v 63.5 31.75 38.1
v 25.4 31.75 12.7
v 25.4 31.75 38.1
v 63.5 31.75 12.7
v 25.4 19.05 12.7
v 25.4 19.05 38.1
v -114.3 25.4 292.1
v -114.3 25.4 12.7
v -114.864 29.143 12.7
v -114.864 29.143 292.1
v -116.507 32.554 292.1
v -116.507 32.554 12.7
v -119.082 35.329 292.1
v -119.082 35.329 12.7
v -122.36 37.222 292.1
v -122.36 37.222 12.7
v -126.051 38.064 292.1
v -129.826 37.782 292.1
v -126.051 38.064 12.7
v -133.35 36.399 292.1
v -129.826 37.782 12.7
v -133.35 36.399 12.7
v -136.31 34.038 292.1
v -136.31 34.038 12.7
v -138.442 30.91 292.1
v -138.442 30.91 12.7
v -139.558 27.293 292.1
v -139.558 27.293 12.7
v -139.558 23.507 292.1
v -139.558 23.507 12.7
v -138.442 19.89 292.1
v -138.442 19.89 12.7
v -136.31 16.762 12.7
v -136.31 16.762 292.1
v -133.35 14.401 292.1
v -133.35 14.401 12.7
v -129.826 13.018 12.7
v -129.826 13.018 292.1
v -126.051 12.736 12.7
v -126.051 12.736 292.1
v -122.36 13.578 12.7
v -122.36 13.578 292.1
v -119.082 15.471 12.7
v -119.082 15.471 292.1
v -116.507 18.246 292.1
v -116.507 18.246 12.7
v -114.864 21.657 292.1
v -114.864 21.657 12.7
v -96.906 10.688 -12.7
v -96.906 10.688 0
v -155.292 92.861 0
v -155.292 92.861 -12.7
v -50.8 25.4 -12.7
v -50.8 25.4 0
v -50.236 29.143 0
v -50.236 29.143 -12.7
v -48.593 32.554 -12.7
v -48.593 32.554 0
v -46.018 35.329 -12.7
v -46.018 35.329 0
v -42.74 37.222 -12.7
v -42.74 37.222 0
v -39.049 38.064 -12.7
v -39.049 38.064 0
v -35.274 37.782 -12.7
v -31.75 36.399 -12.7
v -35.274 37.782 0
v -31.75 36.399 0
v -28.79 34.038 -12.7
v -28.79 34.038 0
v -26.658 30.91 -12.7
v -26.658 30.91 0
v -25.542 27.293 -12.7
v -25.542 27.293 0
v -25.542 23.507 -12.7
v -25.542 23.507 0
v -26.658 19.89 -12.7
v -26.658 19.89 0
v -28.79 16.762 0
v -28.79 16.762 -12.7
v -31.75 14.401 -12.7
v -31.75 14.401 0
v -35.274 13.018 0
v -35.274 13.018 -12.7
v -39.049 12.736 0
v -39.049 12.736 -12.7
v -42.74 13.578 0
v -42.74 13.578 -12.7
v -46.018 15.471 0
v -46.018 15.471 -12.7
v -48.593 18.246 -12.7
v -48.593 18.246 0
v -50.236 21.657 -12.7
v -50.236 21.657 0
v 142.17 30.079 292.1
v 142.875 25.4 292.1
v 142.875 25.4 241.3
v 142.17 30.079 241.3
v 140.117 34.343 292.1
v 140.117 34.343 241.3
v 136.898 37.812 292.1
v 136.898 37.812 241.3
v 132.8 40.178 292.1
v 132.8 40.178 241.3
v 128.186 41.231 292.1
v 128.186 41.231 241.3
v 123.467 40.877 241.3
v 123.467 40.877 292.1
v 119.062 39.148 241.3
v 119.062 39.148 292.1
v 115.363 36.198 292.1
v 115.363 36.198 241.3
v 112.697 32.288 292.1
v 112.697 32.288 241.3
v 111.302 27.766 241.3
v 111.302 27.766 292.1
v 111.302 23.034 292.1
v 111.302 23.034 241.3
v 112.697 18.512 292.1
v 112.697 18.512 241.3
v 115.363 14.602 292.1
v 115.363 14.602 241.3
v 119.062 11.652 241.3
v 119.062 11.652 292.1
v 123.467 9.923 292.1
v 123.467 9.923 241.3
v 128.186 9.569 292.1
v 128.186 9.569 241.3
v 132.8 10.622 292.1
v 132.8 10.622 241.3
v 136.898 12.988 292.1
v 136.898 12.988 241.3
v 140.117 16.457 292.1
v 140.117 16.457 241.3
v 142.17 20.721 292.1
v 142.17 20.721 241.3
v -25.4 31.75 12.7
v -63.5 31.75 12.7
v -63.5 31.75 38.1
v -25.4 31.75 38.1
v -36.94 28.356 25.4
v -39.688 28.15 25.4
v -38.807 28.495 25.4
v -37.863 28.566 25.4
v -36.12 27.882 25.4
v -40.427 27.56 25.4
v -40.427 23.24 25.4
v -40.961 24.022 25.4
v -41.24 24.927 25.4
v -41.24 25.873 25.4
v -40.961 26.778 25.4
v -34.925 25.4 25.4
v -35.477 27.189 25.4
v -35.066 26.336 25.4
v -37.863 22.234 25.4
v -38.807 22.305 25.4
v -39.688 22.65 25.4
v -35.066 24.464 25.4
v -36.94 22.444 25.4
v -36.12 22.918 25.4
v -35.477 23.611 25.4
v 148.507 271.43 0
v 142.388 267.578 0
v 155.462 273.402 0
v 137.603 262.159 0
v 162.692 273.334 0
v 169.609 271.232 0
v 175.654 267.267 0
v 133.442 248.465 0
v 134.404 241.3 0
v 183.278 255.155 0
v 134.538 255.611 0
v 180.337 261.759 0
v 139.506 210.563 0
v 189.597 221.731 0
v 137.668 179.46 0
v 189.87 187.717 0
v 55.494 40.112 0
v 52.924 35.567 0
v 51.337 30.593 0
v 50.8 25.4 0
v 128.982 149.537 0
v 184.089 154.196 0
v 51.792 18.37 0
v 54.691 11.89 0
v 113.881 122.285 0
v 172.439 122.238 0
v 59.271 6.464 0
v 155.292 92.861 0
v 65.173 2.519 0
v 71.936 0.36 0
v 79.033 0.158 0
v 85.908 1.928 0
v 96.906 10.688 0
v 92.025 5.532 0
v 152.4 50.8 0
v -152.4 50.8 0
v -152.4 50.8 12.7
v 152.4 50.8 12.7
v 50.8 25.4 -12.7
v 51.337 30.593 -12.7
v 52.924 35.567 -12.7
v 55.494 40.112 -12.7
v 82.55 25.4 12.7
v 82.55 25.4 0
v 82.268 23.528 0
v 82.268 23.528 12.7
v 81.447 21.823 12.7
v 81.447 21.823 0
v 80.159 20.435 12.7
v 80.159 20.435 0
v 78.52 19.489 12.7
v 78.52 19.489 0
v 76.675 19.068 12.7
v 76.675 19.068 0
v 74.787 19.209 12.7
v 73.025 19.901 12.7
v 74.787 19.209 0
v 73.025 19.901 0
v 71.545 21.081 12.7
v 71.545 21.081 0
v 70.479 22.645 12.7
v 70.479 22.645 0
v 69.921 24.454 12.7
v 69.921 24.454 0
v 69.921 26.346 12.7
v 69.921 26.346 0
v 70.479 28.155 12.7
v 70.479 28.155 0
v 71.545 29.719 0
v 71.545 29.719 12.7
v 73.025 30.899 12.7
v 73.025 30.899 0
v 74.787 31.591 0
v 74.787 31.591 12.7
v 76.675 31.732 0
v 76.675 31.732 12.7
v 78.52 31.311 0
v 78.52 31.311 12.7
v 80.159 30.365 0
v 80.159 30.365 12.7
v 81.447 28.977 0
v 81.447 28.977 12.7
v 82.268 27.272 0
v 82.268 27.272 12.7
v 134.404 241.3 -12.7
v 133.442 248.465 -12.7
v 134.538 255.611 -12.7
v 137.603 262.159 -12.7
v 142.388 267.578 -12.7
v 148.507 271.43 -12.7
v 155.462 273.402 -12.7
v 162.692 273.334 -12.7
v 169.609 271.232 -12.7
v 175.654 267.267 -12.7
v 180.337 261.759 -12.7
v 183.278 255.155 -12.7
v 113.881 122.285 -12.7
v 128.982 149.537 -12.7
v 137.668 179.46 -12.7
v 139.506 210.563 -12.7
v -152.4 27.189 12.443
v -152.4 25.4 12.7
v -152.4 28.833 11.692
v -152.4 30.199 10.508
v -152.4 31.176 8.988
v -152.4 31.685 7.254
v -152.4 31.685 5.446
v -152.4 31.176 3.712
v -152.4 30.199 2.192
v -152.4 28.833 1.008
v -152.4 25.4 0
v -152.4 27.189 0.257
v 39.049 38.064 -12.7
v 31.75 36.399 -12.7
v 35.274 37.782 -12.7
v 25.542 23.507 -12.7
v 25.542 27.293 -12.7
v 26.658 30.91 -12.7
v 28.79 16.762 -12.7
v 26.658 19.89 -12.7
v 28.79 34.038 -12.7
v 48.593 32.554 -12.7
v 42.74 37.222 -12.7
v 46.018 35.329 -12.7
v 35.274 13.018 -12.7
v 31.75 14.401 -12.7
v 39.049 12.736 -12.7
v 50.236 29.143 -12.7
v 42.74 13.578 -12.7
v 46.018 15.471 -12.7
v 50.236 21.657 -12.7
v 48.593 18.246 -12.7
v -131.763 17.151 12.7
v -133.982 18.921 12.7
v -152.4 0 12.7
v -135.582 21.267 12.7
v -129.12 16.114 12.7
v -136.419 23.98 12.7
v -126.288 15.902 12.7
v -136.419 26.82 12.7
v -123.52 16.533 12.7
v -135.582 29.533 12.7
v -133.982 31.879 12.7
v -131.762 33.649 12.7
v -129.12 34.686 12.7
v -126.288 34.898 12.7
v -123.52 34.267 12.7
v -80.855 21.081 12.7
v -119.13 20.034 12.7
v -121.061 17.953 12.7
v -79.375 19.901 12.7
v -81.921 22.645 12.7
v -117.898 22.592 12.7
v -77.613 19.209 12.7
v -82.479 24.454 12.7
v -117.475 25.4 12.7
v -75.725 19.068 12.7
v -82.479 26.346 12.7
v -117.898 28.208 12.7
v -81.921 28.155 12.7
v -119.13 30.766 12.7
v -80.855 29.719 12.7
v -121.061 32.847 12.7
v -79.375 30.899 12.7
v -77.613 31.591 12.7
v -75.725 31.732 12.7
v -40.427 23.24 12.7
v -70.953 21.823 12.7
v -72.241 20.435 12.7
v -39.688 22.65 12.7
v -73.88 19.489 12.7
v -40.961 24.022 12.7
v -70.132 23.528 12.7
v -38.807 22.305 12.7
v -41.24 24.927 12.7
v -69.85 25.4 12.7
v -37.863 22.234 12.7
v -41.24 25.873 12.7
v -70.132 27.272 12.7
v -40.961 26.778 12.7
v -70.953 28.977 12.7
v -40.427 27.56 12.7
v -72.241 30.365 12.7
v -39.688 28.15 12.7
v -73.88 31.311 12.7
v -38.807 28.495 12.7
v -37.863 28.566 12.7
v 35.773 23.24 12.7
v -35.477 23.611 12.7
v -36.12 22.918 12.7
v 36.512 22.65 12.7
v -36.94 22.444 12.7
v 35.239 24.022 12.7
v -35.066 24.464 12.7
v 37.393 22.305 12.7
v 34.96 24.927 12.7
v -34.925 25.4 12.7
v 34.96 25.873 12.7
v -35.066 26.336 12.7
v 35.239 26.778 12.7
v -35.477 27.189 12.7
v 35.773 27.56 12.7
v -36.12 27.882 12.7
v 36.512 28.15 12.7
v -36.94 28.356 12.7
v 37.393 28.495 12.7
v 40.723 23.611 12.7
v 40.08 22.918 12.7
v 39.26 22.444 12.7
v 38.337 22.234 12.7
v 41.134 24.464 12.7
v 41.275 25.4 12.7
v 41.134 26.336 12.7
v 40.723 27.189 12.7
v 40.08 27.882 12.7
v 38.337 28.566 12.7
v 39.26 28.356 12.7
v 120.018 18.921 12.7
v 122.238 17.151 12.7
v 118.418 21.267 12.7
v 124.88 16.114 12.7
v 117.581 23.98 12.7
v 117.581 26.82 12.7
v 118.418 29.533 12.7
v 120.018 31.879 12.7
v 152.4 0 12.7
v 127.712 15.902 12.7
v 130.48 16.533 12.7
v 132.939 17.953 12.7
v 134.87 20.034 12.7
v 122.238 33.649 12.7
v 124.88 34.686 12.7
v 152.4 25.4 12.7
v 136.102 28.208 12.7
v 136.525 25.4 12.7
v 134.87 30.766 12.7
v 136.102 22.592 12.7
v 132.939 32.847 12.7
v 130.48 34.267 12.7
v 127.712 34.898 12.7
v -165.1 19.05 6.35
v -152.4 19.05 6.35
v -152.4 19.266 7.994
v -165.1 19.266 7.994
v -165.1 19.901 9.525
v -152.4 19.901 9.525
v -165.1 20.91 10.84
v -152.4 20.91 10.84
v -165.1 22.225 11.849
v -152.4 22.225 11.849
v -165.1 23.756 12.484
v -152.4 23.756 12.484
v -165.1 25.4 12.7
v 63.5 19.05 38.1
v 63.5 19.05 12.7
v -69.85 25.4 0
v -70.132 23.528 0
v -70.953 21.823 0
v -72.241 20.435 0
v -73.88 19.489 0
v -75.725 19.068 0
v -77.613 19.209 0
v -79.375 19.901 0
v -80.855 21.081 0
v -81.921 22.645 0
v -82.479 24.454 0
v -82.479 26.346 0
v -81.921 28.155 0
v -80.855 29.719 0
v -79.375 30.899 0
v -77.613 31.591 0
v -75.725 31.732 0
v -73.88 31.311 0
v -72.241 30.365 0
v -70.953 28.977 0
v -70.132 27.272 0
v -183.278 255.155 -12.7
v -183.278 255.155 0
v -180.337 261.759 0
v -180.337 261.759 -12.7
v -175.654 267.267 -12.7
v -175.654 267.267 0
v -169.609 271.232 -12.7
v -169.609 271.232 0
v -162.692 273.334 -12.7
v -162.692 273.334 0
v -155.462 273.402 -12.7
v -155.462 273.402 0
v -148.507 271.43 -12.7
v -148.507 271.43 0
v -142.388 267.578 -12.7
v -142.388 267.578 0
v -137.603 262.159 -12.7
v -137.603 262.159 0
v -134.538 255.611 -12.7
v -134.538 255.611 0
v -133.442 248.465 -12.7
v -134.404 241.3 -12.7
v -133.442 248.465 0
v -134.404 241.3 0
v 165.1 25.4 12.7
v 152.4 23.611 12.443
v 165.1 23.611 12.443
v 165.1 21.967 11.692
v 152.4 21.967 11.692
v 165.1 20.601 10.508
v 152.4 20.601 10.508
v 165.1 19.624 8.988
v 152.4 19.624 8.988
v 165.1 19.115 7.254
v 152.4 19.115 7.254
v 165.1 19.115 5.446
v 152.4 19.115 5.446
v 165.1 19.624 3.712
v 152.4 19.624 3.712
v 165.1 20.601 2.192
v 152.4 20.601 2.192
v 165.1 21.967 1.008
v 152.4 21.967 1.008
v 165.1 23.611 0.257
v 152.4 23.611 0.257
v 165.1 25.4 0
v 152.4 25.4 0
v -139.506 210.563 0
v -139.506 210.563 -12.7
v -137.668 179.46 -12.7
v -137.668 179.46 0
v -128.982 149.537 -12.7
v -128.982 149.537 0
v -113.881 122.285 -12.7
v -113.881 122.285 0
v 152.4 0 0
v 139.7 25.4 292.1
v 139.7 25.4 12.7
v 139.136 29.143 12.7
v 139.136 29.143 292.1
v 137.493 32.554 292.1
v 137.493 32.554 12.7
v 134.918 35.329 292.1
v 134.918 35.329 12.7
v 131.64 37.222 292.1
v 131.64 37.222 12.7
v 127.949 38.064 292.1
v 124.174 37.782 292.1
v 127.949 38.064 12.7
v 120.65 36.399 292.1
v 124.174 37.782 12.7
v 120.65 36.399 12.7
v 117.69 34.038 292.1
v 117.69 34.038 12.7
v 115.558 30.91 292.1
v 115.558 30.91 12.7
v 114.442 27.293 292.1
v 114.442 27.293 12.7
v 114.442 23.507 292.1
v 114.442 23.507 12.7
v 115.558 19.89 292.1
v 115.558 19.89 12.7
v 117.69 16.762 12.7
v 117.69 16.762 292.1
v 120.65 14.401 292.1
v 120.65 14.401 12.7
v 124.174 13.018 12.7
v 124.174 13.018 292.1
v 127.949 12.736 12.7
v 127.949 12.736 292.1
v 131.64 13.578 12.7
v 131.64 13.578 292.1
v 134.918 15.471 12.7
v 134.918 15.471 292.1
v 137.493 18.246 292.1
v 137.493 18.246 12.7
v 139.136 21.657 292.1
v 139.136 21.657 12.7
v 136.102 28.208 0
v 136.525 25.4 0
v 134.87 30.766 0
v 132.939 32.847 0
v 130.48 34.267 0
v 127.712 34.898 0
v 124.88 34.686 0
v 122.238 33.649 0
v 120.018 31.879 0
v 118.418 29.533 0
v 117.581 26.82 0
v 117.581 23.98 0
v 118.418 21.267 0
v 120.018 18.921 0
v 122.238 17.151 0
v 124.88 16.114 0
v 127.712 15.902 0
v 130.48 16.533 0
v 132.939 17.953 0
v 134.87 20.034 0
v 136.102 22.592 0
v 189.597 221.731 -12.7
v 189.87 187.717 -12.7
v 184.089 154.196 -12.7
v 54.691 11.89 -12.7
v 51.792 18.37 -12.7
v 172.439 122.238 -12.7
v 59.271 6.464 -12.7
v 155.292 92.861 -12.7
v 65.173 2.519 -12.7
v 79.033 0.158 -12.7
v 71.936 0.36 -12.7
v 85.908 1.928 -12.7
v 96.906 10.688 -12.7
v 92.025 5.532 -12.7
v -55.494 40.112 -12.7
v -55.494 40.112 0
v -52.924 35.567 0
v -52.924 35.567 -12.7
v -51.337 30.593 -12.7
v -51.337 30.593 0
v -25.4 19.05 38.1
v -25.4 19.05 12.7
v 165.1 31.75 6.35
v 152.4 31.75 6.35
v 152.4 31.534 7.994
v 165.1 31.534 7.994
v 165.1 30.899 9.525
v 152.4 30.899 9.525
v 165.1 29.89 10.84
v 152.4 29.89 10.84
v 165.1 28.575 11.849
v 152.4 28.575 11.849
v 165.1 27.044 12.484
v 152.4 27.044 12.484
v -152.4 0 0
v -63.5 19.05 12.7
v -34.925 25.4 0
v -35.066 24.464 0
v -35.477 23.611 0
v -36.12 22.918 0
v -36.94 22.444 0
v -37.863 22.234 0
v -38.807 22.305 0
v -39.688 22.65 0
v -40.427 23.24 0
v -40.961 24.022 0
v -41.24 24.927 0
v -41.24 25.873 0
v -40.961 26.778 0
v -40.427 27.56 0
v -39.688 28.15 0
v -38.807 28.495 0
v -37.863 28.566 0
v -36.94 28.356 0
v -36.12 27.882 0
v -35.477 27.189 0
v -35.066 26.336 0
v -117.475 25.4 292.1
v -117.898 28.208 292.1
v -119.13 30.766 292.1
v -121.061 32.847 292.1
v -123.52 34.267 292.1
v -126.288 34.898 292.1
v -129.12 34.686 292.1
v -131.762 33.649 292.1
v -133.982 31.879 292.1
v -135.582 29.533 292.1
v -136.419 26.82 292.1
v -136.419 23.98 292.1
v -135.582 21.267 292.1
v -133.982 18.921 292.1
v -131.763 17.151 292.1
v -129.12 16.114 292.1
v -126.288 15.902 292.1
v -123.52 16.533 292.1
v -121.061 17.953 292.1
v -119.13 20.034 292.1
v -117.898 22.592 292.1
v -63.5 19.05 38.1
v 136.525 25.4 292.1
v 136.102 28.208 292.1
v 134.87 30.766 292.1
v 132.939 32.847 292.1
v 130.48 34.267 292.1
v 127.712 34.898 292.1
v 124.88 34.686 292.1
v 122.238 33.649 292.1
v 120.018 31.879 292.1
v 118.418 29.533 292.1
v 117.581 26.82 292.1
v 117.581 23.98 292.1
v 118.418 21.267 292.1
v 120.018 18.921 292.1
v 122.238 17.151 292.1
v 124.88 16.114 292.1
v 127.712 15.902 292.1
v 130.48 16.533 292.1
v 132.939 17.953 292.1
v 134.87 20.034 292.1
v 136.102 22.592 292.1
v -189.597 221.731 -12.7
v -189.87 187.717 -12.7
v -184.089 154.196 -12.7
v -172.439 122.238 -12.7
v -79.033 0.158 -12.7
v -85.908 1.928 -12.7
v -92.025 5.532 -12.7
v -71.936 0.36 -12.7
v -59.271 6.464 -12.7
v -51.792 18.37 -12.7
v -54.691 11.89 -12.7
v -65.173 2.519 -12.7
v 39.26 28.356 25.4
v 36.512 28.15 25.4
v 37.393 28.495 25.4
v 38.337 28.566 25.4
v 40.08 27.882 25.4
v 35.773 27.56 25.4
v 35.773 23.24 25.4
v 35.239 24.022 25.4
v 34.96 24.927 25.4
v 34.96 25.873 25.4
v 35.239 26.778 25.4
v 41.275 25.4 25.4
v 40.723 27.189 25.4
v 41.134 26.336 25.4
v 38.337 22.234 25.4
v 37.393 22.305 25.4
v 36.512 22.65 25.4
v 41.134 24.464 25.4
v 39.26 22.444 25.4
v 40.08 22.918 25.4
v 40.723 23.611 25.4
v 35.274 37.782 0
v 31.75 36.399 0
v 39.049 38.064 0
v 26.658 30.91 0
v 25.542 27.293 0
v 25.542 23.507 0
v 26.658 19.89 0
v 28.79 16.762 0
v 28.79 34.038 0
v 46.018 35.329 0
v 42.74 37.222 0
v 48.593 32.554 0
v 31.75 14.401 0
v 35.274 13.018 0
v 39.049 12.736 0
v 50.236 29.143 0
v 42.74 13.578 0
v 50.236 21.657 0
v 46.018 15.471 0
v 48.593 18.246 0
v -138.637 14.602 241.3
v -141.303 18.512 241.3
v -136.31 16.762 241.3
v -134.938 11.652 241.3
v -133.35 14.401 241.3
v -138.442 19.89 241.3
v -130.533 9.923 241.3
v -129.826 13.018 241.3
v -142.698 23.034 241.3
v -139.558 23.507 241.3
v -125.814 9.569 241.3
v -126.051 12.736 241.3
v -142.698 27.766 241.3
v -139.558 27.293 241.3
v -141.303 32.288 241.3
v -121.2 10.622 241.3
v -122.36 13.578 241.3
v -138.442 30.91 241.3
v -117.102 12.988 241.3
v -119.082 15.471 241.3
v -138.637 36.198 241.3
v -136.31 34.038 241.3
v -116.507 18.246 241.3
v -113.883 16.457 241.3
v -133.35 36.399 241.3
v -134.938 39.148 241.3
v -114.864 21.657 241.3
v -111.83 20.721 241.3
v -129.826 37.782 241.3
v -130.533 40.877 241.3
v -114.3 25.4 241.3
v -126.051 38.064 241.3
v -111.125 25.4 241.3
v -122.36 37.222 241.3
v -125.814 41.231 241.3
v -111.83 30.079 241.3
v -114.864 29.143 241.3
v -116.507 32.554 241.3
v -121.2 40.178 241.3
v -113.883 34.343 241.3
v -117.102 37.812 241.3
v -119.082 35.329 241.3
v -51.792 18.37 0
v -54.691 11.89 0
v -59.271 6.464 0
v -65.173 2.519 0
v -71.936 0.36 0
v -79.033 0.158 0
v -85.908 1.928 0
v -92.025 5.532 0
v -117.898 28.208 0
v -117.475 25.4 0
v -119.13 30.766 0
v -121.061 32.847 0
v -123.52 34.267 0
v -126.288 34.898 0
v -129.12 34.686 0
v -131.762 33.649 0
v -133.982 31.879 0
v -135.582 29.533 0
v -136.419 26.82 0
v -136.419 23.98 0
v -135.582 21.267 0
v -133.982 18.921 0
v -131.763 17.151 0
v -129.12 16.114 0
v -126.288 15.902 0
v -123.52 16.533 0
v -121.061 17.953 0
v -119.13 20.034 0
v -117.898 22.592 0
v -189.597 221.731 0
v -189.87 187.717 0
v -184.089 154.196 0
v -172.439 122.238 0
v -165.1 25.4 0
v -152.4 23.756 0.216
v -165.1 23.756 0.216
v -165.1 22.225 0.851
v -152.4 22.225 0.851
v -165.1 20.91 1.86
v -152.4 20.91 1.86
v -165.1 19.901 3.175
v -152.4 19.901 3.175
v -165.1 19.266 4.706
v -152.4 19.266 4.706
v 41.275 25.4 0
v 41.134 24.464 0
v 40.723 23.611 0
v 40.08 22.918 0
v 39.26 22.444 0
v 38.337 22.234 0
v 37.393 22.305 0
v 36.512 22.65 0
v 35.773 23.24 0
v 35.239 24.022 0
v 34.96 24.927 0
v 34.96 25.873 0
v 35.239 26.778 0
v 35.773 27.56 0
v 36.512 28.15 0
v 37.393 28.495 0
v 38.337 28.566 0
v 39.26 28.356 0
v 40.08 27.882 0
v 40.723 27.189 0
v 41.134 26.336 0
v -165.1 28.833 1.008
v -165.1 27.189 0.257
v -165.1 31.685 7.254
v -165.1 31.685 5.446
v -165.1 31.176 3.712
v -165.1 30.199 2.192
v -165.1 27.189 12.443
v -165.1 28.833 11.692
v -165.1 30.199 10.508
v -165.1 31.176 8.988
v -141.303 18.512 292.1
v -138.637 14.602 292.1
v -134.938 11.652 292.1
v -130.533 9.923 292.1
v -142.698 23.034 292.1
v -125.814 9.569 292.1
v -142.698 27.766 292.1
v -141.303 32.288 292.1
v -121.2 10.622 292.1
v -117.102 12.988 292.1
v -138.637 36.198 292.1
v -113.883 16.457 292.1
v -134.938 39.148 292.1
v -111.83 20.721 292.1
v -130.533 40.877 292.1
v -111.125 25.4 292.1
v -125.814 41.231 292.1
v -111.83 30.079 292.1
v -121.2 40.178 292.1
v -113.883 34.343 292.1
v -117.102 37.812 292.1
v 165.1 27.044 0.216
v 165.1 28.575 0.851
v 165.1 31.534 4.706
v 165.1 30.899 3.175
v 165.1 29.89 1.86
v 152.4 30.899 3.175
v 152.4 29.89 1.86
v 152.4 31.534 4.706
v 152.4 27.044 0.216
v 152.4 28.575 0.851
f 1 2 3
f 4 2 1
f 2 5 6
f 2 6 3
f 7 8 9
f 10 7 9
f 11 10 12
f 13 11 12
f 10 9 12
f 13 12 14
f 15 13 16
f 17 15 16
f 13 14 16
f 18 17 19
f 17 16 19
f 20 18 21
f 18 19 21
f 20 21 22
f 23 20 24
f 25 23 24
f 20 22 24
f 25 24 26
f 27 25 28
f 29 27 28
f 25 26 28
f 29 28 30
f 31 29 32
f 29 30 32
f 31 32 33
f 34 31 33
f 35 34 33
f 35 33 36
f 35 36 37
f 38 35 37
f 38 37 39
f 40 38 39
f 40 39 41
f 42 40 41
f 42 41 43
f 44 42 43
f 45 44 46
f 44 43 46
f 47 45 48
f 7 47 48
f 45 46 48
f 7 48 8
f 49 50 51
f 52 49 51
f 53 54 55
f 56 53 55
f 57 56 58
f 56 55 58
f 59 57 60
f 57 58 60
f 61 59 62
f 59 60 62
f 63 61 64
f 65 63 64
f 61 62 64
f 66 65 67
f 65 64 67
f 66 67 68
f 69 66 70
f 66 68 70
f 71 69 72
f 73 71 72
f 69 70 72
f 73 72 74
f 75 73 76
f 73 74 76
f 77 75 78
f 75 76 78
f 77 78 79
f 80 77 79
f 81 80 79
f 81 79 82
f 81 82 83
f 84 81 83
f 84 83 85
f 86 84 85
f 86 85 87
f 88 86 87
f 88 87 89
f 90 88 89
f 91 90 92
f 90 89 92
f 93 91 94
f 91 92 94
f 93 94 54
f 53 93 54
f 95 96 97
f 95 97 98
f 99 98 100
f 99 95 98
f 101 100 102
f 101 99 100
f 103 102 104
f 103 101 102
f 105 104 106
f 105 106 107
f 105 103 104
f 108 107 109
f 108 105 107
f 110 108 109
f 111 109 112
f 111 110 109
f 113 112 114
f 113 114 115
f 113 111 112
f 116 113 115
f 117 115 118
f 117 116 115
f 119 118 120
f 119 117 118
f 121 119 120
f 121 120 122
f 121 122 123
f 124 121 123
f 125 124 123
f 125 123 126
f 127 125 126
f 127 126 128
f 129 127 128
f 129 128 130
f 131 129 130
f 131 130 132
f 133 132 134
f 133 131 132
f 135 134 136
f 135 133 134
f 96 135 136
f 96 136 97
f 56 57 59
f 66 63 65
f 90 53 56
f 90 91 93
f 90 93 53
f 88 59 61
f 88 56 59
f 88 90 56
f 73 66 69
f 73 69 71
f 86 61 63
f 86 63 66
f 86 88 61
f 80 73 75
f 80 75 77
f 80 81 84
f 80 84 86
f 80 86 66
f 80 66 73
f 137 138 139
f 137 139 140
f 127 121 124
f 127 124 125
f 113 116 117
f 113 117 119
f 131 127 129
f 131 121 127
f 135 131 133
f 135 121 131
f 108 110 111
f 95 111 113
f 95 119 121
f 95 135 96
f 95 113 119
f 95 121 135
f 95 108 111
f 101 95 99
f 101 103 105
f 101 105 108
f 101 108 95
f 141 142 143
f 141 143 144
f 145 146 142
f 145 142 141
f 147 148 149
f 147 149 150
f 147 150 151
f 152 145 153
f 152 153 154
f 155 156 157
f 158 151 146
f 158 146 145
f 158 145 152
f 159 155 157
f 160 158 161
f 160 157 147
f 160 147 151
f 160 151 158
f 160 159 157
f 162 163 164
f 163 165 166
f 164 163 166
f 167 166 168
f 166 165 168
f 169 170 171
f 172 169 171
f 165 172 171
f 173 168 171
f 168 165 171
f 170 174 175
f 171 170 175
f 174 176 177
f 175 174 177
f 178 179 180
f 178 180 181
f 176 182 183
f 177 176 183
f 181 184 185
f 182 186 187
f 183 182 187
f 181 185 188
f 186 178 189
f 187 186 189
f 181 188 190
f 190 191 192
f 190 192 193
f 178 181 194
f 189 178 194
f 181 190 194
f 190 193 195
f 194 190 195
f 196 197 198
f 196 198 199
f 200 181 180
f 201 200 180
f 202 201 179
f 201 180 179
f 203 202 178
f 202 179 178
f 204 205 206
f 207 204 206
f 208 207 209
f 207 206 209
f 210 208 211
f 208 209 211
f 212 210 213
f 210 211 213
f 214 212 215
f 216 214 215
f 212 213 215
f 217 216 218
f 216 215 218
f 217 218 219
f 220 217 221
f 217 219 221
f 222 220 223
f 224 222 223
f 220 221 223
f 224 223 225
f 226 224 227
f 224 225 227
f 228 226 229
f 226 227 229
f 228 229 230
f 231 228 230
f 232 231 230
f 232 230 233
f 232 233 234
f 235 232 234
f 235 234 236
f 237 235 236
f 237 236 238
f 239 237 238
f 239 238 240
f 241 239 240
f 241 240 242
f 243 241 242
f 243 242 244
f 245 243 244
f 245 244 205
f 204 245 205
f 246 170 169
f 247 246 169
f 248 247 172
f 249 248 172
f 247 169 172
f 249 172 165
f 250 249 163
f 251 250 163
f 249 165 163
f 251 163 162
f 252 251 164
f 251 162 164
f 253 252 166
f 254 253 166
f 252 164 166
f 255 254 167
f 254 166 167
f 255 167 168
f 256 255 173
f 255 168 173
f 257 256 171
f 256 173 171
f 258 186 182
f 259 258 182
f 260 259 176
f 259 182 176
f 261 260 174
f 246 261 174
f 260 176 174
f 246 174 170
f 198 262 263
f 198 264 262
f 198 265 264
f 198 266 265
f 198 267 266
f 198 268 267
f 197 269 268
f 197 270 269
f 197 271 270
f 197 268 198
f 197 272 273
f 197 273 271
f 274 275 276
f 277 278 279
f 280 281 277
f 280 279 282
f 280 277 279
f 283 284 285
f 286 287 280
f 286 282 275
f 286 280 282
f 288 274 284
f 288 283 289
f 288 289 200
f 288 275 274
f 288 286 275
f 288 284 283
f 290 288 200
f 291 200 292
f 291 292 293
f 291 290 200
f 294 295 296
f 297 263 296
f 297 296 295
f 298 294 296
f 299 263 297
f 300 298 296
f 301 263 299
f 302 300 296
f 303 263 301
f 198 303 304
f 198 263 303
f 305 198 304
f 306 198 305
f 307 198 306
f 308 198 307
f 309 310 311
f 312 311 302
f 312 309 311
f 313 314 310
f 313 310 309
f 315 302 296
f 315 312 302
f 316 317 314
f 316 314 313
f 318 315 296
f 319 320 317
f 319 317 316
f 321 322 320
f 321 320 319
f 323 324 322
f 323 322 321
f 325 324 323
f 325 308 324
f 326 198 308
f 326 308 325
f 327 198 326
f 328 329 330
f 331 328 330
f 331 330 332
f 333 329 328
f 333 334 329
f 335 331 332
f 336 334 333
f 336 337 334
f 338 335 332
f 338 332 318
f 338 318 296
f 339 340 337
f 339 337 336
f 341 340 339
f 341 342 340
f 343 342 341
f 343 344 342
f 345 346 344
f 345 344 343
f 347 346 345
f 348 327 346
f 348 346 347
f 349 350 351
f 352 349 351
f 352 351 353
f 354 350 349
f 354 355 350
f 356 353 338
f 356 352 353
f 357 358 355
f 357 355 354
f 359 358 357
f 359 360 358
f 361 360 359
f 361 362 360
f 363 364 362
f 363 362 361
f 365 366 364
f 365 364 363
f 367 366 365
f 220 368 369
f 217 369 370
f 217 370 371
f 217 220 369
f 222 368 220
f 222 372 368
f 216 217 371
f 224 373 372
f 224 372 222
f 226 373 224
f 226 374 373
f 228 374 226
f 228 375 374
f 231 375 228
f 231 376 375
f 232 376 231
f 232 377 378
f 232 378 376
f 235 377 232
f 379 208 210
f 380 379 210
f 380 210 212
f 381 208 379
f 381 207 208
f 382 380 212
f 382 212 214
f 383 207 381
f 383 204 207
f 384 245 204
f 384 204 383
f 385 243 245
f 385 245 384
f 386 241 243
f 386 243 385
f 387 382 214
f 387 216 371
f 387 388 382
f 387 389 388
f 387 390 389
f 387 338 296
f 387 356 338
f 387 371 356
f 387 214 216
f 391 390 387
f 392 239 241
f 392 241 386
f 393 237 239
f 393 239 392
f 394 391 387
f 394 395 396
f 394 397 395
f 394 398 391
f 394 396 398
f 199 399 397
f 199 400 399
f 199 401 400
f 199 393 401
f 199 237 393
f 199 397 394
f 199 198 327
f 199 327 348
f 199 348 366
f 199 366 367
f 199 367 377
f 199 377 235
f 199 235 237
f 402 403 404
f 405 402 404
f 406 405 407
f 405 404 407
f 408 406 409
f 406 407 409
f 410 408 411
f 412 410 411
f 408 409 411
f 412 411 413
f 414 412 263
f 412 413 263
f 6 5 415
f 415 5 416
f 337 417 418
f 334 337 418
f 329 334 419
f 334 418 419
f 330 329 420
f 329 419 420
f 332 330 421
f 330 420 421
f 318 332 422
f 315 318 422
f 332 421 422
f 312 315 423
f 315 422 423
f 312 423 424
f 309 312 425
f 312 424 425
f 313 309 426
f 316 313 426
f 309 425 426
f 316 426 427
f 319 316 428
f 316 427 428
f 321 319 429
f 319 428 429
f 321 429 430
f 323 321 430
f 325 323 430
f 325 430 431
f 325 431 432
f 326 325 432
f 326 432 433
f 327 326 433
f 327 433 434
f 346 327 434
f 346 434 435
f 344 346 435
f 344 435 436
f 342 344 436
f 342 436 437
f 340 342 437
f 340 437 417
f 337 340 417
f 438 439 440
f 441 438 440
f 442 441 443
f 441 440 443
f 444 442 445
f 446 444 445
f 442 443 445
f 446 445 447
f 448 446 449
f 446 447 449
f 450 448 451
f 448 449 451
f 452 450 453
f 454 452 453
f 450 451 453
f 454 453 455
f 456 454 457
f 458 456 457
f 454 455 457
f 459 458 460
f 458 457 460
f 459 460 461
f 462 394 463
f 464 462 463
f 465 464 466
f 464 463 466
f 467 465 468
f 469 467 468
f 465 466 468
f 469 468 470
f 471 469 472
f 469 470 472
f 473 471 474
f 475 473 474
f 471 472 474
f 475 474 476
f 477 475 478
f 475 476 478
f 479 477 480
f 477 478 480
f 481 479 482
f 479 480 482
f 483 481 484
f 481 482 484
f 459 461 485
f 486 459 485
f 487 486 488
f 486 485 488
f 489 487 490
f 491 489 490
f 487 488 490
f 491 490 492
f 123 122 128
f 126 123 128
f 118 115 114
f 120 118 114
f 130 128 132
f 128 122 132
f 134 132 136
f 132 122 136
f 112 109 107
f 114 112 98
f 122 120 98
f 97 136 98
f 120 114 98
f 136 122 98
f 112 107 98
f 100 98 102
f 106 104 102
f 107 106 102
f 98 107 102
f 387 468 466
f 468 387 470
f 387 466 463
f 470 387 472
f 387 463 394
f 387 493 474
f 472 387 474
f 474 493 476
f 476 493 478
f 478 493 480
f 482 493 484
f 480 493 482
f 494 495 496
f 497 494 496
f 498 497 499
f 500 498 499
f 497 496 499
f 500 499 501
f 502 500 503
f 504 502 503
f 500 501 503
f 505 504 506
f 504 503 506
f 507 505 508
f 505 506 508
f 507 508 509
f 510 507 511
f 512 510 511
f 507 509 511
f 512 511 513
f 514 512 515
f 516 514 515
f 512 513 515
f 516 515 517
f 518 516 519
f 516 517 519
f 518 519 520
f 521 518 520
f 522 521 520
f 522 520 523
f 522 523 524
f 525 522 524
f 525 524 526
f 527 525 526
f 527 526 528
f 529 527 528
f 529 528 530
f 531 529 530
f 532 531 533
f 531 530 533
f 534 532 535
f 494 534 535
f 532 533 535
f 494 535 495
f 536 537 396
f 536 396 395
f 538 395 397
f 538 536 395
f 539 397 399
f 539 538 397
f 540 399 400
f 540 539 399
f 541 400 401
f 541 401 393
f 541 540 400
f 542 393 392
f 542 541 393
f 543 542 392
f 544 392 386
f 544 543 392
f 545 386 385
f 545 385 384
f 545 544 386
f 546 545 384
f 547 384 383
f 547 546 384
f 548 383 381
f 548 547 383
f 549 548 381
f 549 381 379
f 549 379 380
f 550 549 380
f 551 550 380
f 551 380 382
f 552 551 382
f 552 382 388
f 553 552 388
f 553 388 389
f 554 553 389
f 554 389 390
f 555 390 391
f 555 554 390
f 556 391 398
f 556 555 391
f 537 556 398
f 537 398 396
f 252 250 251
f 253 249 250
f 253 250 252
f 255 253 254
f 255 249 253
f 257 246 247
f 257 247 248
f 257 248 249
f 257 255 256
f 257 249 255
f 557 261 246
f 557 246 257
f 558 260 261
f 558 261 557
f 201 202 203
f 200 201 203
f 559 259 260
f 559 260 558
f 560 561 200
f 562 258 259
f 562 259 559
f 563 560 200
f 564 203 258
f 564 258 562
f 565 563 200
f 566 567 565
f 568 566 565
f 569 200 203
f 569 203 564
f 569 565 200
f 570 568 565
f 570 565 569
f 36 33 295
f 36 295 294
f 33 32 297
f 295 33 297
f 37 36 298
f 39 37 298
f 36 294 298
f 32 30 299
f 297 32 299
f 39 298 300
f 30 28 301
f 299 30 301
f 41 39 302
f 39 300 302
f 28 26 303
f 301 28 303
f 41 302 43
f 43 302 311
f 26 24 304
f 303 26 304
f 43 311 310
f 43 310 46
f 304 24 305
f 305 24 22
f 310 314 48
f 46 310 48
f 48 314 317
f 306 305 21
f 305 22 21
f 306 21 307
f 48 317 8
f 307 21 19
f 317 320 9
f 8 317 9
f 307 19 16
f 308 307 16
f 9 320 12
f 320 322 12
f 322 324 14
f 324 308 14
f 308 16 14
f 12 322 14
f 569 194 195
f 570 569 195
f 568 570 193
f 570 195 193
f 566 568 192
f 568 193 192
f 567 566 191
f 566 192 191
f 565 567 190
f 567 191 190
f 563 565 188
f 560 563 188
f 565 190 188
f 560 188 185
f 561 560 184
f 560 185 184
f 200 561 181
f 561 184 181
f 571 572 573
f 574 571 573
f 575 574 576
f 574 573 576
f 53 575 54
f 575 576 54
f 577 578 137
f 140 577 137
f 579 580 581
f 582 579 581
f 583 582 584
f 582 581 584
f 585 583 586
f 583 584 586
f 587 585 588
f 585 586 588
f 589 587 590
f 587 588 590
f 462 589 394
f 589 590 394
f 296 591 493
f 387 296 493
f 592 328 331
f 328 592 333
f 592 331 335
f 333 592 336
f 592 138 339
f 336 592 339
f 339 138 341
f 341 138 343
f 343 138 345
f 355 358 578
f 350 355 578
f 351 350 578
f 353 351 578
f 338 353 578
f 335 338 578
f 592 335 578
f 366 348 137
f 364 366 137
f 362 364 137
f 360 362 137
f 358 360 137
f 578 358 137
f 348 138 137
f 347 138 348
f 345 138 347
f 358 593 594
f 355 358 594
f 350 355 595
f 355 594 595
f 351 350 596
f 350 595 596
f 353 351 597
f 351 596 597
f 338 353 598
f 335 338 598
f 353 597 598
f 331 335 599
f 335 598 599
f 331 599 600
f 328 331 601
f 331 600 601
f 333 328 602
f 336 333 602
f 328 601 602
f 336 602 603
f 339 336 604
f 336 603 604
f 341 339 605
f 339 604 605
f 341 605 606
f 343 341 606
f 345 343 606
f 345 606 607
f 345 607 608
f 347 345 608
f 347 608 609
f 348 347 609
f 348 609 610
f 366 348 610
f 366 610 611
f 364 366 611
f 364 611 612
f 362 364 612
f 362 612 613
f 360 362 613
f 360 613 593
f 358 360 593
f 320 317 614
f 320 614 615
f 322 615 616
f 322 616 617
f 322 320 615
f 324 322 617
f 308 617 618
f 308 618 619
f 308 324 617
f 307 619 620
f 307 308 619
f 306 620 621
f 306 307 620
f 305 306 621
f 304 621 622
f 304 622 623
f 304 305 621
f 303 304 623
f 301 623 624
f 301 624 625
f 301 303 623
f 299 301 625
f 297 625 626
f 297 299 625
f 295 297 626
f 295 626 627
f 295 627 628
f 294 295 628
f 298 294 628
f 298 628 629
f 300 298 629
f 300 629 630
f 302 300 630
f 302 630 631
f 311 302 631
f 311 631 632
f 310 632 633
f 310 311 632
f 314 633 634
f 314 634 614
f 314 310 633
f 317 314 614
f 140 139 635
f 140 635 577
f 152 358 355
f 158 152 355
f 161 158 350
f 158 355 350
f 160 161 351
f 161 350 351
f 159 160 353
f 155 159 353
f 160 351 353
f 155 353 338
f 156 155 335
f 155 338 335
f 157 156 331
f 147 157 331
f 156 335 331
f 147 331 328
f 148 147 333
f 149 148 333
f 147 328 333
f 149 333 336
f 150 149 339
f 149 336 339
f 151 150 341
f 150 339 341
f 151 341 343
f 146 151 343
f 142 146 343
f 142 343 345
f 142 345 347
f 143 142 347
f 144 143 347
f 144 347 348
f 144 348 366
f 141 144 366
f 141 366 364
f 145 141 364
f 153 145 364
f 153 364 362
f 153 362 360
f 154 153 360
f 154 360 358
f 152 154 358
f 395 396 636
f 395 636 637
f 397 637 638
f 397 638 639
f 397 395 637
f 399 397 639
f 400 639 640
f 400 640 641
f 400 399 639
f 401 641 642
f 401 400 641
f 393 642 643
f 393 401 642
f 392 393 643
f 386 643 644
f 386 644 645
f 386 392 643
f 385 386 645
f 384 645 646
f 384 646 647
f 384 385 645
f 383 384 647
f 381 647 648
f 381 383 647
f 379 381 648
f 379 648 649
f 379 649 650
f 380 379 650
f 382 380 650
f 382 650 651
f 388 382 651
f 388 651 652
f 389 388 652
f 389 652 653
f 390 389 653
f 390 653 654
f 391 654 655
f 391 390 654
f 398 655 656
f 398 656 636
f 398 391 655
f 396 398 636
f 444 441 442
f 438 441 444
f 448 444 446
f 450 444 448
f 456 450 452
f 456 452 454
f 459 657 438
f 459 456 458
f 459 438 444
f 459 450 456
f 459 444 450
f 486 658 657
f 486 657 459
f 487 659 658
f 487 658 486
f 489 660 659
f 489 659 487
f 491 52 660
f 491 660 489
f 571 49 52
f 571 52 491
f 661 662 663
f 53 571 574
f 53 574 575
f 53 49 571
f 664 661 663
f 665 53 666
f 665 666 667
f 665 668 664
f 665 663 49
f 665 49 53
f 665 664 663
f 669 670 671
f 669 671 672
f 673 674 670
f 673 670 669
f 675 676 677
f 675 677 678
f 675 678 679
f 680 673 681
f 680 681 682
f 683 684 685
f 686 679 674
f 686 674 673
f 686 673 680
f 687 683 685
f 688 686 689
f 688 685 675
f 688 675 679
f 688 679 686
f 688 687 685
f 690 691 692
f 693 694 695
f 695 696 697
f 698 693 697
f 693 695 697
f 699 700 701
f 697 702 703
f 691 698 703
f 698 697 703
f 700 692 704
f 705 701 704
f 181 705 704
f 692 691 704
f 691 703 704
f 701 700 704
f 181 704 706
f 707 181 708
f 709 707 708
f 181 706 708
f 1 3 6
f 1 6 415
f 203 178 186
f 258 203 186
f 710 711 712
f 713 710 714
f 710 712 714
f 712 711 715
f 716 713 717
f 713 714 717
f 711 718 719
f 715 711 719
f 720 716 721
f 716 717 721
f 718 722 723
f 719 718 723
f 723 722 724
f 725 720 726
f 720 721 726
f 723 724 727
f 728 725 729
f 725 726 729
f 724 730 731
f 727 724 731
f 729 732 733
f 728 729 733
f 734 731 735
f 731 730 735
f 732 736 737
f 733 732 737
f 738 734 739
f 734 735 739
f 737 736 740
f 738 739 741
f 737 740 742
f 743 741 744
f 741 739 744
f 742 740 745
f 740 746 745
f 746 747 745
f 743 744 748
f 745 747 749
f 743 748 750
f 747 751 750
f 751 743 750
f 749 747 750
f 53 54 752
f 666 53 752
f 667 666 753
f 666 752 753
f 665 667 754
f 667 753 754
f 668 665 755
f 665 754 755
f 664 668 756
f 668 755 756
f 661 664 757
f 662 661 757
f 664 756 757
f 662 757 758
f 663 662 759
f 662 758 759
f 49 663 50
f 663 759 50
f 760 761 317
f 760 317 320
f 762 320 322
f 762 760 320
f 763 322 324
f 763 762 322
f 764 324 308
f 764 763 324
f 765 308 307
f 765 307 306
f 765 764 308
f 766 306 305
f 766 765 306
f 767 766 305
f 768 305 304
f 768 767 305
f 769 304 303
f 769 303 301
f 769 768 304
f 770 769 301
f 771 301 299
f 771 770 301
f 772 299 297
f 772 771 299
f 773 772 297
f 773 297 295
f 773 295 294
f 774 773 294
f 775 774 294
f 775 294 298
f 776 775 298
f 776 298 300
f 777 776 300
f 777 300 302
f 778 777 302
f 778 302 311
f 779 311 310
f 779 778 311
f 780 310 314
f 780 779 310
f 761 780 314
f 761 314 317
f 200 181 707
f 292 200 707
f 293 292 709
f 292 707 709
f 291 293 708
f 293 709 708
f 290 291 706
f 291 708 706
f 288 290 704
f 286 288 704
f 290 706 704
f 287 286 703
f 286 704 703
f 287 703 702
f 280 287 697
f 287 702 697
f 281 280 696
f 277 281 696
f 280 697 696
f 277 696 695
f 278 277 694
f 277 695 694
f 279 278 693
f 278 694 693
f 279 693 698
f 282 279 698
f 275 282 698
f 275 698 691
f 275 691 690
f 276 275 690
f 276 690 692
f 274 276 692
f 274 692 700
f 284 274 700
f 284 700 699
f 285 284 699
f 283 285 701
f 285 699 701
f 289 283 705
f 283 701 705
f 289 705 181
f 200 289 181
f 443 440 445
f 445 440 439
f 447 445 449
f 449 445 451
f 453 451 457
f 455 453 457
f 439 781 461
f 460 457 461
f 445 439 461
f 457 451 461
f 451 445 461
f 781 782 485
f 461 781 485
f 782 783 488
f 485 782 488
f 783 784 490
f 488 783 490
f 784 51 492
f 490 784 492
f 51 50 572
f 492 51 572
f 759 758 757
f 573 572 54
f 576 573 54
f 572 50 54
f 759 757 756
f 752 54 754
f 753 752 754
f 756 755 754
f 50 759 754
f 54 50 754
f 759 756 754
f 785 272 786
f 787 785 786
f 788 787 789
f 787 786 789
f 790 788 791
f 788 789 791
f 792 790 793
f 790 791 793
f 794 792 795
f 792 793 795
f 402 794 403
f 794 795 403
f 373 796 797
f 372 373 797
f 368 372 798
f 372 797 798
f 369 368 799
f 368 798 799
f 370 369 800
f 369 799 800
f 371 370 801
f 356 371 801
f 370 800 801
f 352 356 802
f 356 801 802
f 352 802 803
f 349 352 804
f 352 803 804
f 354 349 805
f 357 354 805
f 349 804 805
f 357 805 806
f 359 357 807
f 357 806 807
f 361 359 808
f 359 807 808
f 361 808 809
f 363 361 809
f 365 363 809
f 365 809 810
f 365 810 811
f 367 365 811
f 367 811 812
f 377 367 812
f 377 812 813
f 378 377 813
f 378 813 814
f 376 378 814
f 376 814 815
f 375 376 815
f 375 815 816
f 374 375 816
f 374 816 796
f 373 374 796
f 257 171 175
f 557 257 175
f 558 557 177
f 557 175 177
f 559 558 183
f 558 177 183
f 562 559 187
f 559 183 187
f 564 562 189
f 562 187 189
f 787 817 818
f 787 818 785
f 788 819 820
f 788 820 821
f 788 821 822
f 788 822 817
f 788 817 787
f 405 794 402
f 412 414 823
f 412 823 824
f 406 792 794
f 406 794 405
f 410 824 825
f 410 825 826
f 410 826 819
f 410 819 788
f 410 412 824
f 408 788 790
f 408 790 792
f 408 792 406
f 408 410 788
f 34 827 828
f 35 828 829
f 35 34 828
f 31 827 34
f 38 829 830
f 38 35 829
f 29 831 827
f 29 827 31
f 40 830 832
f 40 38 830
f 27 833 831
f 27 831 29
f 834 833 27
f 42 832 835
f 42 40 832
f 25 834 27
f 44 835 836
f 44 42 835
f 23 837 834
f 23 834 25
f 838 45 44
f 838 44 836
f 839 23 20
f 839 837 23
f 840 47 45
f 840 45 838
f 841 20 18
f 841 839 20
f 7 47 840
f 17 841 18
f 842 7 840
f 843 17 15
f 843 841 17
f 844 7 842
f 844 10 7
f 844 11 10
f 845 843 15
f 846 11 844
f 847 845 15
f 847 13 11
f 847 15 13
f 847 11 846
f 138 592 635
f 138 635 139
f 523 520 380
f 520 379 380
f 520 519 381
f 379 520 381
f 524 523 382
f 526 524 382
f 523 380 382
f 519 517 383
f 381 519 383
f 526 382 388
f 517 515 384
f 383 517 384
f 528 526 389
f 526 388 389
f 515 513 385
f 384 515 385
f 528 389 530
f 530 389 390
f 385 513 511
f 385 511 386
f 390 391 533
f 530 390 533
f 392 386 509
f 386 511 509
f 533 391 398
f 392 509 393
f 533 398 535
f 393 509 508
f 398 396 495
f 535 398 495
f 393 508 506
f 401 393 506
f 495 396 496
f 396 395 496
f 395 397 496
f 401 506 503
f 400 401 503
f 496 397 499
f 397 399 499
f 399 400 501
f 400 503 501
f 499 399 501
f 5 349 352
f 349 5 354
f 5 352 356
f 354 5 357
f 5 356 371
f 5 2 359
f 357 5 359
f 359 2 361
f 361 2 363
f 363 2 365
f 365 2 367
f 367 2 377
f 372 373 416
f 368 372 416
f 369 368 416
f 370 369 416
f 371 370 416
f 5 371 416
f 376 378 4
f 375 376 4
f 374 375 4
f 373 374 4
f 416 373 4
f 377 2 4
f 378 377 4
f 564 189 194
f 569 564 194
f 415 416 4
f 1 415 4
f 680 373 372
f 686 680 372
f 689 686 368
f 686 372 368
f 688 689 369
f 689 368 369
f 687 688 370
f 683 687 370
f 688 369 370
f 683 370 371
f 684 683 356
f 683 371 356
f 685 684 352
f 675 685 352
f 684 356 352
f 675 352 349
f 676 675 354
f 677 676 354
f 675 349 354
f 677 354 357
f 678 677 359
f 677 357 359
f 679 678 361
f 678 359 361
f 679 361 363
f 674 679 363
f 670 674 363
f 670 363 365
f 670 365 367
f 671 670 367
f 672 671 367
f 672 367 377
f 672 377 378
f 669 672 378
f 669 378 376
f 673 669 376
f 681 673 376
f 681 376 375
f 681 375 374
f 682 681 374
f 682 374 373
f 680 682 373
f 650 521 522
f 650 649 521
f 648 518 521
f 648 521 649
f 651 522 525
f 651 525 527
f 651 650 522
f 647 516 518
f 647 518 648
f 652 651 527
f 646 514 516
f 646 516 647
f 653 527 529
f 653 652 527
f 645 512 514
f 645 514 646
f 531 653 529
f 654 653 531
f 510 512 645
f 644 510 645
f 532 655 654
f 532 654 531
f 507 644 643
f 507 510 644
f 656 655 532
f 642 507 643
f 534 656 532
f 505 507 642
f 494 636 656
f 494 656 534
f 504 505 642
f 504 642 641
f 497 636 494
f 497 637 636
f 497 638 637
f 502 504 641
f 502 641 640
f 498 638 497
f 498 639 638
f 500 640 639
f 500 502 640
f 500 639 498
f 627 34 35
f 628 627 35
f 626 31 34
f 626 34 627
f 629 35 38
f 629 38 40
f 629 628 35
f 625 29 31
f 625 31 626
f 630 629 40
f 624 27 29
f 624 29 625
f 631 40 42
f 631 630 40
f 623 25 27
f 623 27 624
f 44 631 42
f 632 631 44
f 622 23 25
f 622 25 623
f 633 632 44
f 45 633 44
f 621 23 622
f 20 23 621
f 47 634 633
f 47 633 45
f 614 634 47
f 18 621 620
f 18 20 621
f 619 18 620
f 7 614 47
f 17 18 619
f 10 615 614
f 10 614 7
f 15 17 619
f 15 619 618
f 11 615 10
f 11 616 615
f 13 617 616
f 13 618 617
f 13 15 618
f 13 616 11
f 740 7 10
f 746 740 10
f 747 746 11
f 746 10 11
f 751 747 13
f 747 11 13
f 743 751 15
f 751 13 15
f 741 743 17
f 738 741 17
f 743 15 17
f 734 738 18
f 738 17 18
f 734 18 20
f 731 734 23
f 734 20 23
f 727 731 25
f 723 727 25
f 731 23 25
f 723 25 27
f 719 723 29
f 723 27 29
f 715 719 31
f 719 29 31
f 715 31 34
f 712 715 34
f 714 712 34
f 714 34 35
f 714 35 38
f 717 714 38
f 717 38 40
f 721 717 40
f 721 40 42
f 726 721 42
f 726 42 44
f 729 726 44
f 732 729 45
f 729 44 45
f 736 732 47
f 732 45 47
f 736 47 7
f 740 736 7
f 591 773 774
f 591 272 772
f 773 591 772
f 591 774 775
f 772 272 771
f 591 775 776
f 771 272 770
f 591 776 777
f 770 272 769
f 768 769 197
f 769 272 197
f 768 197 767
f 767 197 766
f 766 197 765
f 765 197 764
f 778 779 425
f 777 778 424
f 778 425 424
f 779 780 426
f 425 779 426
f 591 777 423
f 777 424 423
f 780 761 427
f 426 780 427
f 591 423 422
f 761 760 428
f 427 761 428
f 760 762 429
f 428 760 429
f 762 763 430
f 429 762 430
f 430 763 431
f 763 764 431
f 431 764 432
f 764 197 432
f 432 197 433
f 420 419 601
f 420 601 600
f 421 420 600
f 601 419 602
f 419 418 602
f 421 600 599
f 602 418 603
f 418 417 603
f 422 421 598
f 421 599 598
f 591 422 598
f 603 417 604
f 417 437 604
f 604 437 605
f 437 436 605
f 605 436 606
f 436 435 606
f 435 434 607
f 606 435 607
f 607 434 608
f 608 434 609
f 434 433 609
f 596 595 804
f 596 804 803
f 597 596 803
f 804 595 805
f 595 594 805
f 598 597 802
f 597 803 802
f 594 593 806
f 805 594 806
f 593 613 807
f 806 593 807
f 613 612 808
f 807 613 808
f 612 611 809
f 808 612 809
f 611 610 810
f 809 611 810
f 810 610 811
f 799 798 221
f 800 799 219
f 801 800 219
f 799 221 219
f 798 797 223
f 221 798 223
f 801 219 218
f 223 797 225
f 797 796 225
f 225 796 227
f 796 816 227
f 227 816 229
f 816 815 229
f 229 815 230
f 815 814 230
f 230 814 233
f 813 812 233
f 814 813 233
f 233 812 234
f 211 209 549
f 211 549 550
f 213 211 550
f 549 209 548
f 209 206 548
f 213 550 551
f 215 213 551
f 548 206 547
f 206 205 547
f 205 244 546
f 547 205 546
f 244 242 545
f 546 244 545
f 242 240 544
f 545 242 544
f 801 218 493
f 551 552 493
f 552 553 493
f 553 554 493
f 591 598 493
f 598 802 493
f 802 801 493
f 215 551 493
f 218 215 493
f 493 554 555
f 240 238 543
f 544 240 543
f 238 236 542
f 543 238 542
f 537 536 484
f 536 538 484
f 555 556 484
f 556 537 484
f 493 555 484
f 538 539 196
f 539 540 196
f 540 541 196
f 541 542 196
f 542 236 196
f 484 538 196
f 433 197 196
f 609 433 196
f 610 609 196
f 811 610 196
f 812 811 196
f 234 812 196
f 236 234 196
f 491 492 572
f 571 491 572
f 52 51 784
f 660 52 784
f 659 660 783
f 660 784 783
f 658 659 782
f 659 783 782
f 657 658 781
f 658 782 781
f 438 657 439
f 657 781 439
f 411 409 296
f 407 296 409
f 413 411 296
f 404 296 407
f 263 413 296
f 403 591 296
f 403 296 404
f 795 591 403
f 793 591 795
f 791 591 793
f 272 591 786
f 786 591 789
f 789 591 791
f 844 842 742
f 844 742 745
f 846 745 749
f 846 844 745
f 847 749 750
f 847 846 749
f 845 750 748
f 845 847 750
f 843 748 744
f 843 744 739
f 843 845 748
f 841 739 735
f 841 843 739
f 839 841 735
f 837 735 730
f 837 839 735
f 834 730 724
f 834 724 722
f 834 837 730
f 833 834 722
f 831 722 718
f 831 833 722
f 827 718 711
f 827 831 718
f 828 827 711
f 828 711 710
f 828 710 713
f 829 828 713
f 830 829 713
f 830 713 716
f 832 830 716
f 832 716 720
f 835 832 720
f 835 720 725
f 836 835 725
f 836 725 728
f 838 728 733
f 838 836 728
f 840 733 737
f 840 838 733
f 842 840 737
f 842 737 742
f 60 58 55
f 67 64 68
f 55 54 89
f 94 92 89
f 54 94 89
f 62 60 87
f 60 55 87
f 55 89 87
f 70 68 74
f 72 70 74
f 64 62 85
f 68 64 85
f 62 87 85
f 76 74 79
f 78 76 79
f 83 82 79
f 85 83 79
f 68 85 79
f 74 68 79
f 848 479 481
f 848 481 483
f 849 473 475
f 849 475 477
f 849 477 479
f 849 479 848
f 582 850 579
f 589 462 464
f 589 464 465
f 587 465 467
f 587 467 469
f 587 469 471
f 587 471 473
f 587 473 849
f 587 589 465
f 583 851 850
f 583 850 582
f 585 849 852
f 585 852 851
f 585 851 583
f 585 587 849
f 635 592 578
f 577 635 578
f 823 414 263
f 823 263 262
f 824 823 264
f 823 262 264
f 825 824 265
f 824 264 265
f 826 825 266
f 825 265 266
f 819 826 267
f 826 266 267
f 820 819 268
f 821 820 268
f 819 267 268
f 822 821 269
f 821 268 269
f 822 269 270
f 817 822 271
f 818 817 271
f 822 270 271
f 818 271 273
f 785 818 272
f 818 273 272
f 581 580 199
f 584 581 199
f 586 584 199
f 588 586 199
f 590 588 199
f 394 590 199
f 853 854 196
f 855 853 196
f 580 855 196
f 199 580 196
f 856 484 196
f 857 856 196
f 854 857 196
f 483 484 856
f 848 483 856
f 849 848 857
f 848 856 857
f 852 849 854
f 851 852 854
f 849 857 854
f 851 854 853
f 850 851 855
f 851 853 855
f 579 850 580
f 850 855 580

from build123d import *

# Parameters (mm, degrees)
F0_W      = 304.8
F0_H      = 50.8
F0_R      = 9.525
F1_DEPTH  = 12.7
F2_R      = 12.7
F2_R_2    = 9.525
F3_DEPTH  = 279.4
F4_W      = 38.1
F4_H      = 12.7
F5_DEPTH  = 25.4
F6_R      = 3.175
F6_R_2    = 6.35
F7_DEPTH  = 25.4
F9_DEPTH  = 12.7
F8_R      = 12.7
F10_R     = 15.875
F10_R_2   = 12.7
F11_DEPTH = 50.8
F14_DEPTH = 12.7
F15_DEPTH = 12.7


with BuildPart() as f1:
    # F0 (on Top) → F1 (new body)
    with BuildSketch(Plane.XY):
        with Locations((0, 25.4)):
            Rectangle(F0_W, F0_H)
        with Locations((-127, 25.4)):
            Circle(F0_R, mode=Mode.SUBTRACT)
        with Locations((127, 25.4)):
            Circle(F0_R, mode=Mode.SUBTRACT)
    extrude(amount=F1_DEPTH)


with BuildPart() as f3:
    # F2 (on face) → F3 (new body)
    with BuildSketch(Plane.XY.offset(12.7)):
        with Locations((-127, 25.4)):
            Circle(F2_R)
        with Locations((-127, 25.4)):
            Circle(F2_R_2, mode=Mode.SUBTRACT)
    extrude(amount=F3_DEPTH)


with BuildPart() as f3b:
    # F2 (on face) → F3, piece 2 (new body)
    with BuildSketch(Plane.XY.offset(12.7)):
        with Locations((127, 25.4)):
            Circle(F2_R)
        with Locations((127, 25.4)):
            Circle(F2_R_2, mode=Mode.SUBTRACT)
    extrude(amount=F3_DEPTH)


with BuildPart() as f5:
    # F4 (on face) → F5 (new body)
    with BuildSketch(Plane.XY.offset(12.7)):
        with Locations((44.45, 25.4)):
            Rectangle(F4_W, F4_H)
    extrude(amount=F5_DEPTH)


with BuildPart() as f5b:
    # F4 (on face) → F5, piece 2 (new body)
    with BuildSketch(Plane.XY.offset(12.7)):
        with Locations((-44.45, 25.4)):
            Rectangle(F4_W, F4_H)
    extrude(amount=F5_DEPTH)


with BuildPart() as f7_tool:
    # F6 (on face) → F7 (new body)
    with BuildSketch(Plane(origin=(0, 0, 0), x_dir=(1, 0, 0), z_dir=(0, 0, -1))):
        with Locations((-38.1, -25.4)):
            Circle(F6_R)
        with Locations((38.1, -25.4)):
            Circle(F6_R)
        with Locations((-76.2, -25.4)):
            Circle(F6_R_2)
        with Locations((76.2, -25.4)):
            Circle(F6_R_2)
    extrude(amount=-F7_DEPTH)


with BuildPart() as f1_1:
    add(f1.part)

    # F7: cut by f7_tool
    add(f7_tool.part, mode=Mode.SUBTRACT)

    # F12 (on face) → F14 (join)
    with BuildSketch(Plane.YZ.offset(152.4)):
        with BuildLine():
            ThreePointArc((25.4, 0), (29.8901280605, 1.8598719395), (31.75, 6.35))
            ThreePointArc((31.75, 6.35), (29.8901280605, 10.8401280605), (25.4, 12.7))
            ThreePointArc((25.4, 12.7), (19.05, 6.35), (25.4, 0))
        make_face()
    extrude(amount=F14_DEPTH)

    # F13 (on face) → F15 (join)
    with BuildSketch(Plane(origin=(-152.4, 0, 0), x_dir=(0, -1, 0), z_dir=(-1, 0, 0))):
        with BuildLine():
            ThreePointArc((-25.4, 0), (-20.9098719395, 1.8598719395), (-19.05, 6.35))
            ThreePointArc((-19.05, 6.35), (-20.9098719395, 10.8401280605), (-25.4, 12.7))
            ThreePointArc((-25.4, 12.7), (-31.75, 6.35), (-25.4, 0))
        make_face()
    extrude(amount=F15_DEPTH)


with BuildPart() as f5_1:
    add(f5.part)

    # F7: cut by f7_tool
    add(f7_tool.part, mode=Mode.SUBTRACT)


with BuildPart() as f5b_1:
    add(f5b.part)

    # F7: cut by f7_tool
    add(f7_tool.part, mode=Mode.SUBTRACT)


with BuildPart() as f9:
    # F8 (on face) → F9 (new body)
    with BuildSketch(Plane(origin=(0, 0, 0), x_dir=(1, 0, 0), z_dir=(0, 0, -1))):
        with BuildLine():
            Line((-113.8805225972, -122.2845096845), (-55.4944504369, -40.1119073301))
            ThreePointArc((-55.4944504369, -40.1119073301), (-52.002056297, -33.12136779), (-50.8, -25.4))
            ThreePointArc((-50.8, -25.4), (-68.47863221, -1.202056297), (-96.9055495631, -10.6880926699))
            Line((-96.9055495631, -10.6880926699), (-155.2916217234, -92.8606950243))
            ThreePointArc((-155.2916217234, -92.8606950243), (-187.7291663497, -170.8270158675), (-183.2784090028, -255.1545454545))
            ThreePointArc((-183.2784090028, -255.1545454545), (-151.9140150752, -272.6643939277), (-134.4041666021, -241.3))
            ThreePointArc((-134.4041666021, -241.3), (-137.6680553231, -179.4598116362), (-113.8805225972, -122.2845096845))
        make_face()
    extrude(amount=F9_DEPTH)


with BuildPart() as f9b:
    # F8 (on face) → F9, piece 2 (new body)
    with BuildSketch(Plane(origin=(0, 0, 0), x_dir=(1, 0, 0), z_dir=(0, 0, -1))):
        with BuildLine():
            ThreePointArc((-25.4, -25.4), (-38.1, -12.7), (-50.8, -25.4))
            ThreePointArc((-50.8, -25.4), (-38.1, -38.1), (-25.4, -25.4))
        make_face()
    extrude(amount=F9_DEPTH)


with BuildPart() as f9c:
    # F8 (on face) → F9, piece 3 (new body)
    with BuildSketch(Plane(origin=(0, 0, 0), x_dir=(1, 0, 0), z_dir=(0, 0, -1))):
        with Locations((38.1, -25.4)):
            Circle(F8_R)
    extrude(amount=F9_DEPTH)


with BuildPart() as f9d:
    # F8 (on face) → F9, piece 4 (new body)
    with BuildSketch(Plane(origin=(0, 0, 0), x_dir=(1, 0, 0), z_dir=(0, 0, -1))):
        with BuildLine():
            ThreePointArc((96.9055495631, -10.6880926699), (68.47863221, -1.202056297), (50.8, -25.4))
            ThreePointArc((50.8, -25.4), (52.002056297, -33.12136779), (55.4944504369, -40.1119073301))
            Line((55.4944504369, -40.1119073301), (113.8805225972, -122.2845096845))
            ThreePointArc((113.8805225972, -122.2845096845), (137.6680553231, -179.4598116362), (134.4041666021, -241.3))
            ThreePointArc((134.4041666021, -241.3), (151.9140150752, -272.6643939277), (183.2784090028, -255.1545454545))
            ThreePointArc((183.2784090028, -255.1545454545), (187.7291663497, -170.8270158675), (155.2916217234, -92.8606950243))
            Line((155.2916217234, -92.8606950243), (96.9055495631, -10.6880926699))
        make_face()
    extrude(amount=F9_DEPTH)


with BuildPart() as f11:
    # F10 (on face) → F11 (new body)
    with BuildSketch(Plane.XY.offset(292.1)):
        with Locations((-127, 25.4)):
            Circle(F10_R)
        with Locations((-127, 25.4)):
            Circle(F10_R_2, mode=Mode.SUBTRACT)
    extrude(amount=-F11_DEPTH)


with BuildPart() as f11b:
    # F10 (on face) → F11, piece 2 (new body)
    with BuildSketch(Plane.XY.offset(292.1)):
        with Locations((127, 25.4)):
            Circle(F10_R)
    extrude(amount=-F11_DEPTH)


solid = Compound([f3.part, f3b.part, f1_1.part, f5_1.part, f5b_1.part, f9.part, f9b.part, f9c.part, f9d.part, f11.part, f11b.part])
